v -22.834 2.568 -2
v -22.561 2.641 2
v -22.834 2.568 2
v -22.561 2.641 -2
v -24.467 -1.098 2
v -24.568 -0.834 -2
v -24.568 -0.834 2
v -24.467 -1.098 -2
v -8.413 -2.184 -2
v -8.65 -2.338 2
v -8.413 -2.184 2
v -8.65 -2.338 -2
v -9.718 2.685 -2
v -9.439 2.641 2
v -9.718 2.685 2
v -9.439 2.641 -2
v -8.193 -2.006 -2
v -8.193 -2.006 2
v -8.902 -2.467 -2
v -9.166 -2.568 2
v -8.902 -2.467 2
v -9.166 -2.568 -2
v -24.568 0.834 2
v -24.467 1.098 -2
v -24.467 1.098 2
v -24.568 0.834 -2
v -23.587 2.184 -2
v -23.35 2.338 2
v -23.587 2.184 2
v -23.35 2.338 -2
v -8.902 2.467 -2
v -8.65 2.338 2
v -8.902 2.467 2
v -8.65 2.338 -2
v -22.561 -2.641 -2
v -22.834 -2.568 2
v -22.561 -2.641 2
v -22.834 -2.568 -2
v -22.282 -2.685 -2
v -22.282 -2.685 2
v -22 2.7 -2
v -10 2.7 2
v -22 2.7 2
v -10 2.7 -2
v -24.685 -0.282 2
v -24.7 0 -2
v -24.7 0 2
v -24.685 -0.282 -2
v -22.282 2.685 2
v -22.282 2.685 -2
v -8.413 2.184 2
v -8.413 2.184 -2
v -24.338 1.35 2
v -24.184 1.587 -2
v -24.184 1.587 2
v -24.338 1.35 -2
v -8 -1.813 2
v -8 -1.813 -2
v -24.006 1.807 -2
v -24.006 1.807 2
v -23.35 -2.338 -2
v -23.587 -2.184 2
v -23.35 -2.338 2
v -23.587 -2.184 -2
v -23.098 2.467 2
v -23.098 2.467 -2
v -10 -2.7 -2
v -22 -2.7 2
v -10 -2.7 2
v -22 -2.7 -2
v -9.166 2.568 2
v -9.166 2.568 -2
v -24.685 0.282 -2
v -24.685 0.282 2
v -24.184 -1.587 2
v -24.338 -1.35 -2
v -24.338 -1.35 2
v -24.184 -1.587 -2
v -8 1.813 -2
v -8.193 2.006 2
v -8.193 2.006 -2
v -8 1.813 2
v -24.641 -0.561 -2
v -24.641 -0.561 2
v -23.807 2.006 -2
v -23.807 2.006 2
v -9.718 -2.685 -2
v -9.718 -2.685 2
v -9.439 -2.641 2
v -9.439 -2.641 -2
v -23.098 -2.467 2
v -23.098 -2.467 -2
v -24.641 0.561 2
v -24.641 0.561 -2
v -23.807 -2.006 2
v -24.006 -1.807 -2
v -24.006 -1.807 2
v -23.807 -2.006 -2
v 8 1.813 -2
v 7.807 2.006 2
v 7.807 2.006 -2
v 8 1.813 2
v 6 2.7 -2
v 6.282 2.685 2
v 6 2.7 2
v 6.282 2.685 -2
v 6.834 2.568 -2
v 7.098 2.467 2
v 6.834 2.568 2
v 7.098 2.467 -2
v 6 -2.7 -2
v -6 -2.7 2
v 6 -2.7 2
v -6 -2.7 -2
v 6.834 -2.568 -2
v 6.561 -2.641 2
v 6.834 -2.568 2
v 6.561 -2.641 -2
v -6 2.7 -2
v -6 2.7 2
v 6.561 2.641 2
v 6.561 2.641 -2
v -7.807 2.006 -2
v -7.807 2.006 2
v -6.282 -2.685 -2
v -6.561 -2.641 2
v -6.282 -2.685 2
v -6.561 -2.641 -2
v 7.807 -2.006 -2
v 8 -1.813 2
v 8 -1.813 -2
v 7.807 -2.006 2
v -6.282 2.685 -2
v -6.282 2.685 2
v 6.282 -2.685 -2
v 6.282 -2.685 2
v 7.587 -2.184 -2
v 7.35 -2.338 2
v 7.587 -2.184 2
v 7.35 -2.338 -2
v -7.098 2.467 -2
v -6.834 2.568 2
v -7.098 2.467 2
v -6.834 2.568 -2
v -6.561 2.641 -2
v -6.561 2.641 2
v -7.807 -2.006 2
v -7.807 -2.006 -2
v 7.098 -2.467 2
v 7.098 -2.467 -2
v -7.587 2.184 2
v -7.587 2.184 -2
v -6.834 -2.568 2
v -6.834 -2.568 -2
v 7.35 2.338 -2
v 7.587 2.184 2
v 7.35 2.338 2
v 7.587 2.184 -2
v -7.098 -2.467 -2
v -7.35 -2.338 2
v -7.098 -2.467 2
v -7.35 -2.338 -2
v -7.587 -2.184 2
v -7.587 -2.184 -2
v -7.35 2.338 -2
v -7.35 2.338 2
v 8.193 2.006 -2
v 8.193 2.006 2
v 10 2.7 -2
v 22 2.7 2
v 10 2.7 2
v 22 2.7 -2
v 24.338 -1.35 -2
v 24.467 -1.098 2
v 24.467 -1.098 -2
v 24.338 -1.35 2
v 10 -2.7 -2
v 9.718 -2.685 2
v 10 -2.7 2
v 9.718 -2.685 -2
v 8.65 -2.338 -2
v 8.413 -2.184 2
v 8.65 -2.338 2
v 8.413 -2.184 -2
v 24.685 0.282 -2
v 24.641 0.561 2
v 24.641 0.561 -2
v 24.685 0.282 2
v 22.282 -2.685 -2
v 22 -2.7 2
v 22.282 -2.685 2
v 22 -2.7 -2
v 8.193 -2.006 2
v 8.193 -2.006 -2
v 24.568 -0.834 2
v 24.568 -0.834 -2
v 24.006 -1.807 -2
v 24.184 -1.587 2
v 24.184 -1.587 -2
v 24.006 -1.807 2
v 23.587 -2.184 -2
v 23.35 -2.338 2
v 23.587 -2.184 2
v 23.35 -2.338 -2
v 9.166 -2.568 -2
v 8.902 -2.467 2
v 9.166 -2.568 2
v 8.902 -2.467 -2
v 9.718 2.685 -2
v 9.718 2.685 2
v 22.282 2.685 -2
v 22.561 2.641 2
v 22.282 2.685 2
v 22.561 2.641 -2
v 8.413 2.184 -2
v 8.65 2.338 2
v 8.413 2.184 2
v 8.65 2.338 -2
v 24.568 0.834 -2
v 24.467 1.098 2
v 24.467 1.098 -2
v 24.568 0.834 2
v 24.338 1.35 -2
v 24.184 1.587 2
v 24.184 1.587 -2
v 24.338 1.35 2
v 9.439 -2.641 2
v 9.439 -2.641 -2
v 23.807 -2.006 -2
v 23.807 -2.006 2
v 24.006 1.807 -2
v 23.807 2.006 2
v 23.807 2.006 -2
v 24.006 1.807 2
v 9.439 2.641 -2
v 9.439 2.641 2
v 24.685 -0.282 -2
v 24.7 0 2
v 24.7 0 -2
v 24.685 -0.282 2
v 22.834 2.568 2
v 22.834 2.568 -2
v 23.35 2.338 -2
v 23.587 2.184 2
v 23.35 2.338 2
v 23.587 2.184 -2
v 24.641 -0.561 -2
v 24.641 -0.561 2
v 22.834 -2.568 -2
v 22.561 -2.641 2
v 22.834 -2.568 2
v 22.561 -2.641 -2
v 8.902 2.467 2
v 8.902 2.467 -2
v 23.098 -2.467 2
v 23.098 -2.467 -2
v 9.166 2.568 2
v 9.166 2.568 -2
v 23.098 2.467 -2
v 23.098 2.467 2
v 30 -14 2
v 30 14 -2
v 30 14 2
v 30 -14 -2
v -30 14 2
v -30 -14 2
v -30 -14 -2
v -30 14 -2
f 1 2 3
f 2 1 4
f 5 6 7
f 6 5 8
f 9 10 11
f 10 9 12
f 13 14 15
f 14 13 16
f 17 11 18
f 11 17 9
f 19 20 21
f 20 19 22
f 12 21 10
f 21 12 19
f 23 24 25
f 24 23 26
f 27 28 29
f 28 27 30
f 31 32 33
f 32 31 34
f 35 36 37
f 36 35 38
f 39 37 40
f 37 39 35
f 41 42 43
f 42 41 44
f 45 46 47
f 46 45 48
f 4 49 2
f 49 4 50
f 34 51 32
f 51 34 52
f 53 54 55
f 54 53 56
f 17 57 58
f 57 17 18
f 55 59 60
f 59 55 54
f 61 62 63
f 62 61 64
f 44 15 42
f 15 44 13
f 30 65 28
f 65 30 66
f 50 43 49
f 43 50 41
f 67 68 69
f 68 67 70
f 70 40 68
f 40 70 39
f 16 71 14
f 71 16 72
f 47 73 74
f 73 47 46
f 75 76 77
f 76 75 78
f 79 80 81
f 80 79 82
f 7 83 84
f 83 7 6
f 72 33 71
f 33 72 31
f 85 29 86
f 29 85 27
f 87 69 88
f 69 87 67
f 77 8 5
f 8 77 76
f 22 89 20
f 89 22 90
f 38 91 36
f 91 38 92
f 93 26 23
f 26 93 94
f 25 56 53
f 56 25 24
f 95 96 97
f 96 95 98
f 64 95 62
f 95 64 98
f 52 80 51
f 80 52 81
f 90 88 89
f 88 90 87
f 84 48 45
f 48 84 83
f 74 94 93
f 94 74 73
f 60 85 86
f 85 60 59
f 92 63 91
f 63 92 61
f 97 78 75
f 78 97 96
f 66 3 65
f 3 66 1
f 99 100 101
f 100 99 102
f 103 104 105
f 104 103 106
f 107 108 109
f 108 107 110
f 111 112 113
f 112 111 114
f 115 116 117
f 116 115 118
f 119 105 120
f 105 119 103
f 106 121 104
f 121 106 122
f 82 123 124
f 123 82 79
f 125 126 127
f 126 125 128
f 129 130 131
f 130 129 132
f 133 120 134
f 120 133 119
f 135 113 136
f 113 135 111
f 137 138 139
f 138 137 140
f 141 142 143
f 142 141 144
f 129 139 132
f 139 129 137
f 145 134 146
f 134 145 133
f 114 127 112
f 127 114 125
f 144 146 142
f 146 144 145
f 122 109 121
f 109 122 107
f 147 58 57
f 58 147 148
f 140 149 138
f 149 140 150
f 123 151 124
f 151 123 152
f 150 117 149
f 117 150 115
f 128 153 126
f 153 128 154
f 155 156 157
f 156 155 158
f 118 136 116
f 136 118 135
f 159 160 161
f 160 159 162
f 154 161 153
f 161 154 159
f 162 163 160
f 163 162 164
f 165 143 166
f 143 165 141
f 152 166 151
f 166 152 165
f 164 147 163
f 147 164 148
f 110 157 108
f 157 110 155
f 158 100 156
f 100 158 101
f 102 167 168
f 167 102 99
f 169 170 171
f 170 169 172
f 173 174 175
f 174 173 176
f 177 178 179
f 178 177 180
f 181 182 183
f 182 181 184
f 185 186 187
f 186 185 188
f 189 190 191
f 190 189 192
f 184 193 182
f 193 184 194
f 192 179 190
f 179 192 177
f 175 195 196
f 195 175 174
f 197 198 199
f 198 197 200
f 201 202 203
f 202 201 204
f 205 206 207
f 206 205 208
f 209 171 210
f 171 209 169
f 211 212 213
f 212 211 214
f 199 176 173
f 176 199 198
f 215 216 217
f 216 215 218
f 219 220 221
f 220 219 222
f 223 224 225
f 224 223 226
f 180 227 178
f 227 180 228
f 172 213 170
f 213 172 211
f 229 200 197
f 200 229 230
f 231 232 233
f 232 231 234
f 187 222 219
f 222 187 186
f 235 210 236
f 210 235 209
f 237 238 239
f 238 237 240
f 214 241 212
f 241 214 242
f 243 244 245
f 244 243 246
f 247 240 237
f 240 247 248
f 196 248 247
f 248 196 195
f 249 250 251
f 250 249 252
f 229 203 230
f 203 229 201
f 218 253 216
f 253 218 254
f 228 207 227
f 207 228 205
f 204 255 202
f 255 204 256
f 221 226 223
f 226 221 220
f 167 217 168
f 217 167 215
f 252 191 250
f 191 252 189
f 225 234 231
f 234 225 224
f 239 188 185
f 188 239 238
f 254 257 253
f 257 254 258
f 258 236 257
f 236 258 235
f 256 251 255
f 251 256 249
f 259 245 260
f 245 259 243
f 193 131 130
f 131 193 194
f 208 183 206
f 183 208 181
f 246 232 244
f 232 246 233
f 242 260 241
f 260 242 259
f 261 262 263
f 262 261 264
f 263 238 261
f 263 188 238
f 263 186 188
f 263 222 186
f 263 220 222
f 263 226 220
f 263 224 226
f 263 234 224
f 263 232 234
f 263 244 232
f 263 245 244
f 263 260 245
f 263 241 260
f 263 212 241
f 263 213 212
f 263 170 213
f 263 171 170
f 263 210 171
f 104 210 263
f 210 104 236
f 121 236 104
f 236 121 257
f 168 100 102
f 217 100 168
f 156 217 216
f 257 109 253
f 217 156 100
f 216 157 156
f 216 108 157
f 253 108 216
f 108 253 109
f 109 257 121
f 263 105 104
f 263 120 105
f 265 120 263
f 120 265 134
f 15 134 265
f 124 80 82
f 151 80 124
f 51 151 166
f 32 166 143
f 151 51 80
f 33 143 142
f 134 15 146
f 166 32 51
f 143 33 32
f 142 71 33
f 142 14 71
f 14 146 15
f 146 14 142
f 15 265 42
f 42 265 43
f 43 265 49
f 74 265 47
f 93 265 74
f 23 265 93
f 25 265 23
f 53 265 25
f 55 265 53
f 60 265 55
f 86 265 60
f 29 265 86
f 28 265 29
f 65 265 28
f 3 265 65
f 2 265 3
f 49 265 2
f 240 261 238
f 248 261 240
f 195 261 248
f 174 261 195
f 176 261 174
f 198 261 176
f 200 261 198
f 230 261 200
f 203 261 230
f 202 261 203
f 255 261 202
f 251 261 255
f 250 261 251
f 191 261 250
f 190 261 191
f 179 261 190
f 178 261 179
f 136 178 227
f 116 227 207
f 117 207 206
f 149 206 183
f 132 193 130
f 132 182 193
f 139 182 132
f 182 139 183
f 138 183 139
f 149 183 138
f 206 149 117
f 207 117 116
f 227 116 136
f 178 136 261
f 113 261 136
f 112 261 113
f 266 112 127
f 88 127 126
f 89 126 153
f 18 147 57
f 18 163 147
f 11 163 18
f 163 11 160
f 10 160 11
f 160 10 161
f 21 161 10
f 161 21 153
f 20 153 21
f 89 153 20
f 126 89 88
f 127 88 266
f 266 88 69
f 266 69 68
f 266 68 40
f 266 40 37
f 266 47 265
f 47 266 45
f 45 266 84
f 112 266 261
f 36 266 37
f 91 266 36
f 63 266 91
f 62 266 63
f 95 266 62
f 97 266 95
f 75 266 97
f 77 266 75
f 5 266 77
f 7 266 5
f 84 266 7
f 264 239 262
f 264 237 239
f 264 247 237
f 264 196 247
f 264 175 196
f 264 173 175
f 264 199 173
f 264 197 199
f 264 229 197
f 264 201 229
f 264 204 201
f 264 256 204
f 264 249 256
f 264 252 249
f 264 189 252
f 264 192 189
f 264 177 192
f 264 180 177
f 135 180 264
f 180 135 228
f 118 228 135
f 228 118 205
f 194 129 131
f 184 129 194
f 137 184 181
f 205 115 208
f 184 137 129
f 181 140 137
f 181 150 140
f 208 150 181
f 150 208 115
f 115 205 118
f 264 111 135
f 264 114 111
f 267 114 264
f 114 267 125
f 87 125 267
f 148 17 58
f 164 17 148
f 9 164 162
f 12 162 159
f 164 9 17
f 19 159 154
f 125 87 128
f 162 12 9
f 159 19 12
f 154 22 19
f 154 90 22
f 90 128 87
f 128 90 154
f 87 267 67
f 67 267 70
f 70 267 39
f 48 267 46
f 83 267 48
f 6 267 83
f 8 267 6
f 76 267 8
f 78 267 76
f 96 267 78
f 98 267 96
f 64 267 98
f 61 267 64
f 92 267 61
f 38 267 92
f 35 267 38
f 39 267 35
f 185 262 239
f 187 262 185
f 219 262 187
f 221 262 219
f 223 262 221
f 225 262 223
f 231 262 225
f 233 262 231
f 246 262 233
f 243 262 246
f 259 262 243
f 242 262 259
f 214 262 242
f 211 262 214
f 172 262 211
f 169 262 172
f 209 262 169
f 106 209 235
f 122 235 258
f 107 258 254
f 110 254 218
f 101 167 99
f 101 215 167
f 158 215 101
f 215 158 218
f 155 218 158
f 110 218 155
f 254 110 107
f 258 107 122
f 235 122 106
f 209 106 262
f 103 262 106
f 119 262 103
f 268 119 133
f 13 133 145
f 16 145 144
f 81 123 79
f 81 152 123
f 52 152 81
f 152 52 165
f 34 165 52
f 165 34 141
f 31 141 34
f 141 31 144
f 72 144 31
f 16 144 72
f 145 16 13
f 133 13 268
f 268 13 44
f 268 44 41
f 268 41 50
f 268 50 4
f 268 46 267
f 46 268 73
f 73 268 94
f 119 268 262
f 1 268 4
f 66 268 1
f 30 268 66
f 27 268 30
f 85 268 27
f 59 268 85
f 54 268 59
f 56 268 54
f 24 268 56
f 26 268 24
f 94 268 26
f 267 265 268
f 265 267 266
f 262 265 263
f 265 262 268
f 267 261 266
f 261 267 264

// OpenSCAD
// Slotted mounting plate.
$fn = 60;
eps = 0.02;
plate_l = 60;
plate_w = 28;
plate_t = 4;
slot_l = 12;
module slot(x) { hull() { translate([x-slot_l/2,0,-plate_t/2-eps]) cylinder(d=5.4,h=plate_t+2*eps); translate([x+slot_l/2,0,-plate_t/2-eps]) cylinder(d=5.4,h=plate_t+2*eps); } }
difference() { cube([plate_l,plate_w,plate_t],center=true); for(i=[0:2]) slot(-plate_l/2+14+i*(plate_l-28)/max(1,2)); }
